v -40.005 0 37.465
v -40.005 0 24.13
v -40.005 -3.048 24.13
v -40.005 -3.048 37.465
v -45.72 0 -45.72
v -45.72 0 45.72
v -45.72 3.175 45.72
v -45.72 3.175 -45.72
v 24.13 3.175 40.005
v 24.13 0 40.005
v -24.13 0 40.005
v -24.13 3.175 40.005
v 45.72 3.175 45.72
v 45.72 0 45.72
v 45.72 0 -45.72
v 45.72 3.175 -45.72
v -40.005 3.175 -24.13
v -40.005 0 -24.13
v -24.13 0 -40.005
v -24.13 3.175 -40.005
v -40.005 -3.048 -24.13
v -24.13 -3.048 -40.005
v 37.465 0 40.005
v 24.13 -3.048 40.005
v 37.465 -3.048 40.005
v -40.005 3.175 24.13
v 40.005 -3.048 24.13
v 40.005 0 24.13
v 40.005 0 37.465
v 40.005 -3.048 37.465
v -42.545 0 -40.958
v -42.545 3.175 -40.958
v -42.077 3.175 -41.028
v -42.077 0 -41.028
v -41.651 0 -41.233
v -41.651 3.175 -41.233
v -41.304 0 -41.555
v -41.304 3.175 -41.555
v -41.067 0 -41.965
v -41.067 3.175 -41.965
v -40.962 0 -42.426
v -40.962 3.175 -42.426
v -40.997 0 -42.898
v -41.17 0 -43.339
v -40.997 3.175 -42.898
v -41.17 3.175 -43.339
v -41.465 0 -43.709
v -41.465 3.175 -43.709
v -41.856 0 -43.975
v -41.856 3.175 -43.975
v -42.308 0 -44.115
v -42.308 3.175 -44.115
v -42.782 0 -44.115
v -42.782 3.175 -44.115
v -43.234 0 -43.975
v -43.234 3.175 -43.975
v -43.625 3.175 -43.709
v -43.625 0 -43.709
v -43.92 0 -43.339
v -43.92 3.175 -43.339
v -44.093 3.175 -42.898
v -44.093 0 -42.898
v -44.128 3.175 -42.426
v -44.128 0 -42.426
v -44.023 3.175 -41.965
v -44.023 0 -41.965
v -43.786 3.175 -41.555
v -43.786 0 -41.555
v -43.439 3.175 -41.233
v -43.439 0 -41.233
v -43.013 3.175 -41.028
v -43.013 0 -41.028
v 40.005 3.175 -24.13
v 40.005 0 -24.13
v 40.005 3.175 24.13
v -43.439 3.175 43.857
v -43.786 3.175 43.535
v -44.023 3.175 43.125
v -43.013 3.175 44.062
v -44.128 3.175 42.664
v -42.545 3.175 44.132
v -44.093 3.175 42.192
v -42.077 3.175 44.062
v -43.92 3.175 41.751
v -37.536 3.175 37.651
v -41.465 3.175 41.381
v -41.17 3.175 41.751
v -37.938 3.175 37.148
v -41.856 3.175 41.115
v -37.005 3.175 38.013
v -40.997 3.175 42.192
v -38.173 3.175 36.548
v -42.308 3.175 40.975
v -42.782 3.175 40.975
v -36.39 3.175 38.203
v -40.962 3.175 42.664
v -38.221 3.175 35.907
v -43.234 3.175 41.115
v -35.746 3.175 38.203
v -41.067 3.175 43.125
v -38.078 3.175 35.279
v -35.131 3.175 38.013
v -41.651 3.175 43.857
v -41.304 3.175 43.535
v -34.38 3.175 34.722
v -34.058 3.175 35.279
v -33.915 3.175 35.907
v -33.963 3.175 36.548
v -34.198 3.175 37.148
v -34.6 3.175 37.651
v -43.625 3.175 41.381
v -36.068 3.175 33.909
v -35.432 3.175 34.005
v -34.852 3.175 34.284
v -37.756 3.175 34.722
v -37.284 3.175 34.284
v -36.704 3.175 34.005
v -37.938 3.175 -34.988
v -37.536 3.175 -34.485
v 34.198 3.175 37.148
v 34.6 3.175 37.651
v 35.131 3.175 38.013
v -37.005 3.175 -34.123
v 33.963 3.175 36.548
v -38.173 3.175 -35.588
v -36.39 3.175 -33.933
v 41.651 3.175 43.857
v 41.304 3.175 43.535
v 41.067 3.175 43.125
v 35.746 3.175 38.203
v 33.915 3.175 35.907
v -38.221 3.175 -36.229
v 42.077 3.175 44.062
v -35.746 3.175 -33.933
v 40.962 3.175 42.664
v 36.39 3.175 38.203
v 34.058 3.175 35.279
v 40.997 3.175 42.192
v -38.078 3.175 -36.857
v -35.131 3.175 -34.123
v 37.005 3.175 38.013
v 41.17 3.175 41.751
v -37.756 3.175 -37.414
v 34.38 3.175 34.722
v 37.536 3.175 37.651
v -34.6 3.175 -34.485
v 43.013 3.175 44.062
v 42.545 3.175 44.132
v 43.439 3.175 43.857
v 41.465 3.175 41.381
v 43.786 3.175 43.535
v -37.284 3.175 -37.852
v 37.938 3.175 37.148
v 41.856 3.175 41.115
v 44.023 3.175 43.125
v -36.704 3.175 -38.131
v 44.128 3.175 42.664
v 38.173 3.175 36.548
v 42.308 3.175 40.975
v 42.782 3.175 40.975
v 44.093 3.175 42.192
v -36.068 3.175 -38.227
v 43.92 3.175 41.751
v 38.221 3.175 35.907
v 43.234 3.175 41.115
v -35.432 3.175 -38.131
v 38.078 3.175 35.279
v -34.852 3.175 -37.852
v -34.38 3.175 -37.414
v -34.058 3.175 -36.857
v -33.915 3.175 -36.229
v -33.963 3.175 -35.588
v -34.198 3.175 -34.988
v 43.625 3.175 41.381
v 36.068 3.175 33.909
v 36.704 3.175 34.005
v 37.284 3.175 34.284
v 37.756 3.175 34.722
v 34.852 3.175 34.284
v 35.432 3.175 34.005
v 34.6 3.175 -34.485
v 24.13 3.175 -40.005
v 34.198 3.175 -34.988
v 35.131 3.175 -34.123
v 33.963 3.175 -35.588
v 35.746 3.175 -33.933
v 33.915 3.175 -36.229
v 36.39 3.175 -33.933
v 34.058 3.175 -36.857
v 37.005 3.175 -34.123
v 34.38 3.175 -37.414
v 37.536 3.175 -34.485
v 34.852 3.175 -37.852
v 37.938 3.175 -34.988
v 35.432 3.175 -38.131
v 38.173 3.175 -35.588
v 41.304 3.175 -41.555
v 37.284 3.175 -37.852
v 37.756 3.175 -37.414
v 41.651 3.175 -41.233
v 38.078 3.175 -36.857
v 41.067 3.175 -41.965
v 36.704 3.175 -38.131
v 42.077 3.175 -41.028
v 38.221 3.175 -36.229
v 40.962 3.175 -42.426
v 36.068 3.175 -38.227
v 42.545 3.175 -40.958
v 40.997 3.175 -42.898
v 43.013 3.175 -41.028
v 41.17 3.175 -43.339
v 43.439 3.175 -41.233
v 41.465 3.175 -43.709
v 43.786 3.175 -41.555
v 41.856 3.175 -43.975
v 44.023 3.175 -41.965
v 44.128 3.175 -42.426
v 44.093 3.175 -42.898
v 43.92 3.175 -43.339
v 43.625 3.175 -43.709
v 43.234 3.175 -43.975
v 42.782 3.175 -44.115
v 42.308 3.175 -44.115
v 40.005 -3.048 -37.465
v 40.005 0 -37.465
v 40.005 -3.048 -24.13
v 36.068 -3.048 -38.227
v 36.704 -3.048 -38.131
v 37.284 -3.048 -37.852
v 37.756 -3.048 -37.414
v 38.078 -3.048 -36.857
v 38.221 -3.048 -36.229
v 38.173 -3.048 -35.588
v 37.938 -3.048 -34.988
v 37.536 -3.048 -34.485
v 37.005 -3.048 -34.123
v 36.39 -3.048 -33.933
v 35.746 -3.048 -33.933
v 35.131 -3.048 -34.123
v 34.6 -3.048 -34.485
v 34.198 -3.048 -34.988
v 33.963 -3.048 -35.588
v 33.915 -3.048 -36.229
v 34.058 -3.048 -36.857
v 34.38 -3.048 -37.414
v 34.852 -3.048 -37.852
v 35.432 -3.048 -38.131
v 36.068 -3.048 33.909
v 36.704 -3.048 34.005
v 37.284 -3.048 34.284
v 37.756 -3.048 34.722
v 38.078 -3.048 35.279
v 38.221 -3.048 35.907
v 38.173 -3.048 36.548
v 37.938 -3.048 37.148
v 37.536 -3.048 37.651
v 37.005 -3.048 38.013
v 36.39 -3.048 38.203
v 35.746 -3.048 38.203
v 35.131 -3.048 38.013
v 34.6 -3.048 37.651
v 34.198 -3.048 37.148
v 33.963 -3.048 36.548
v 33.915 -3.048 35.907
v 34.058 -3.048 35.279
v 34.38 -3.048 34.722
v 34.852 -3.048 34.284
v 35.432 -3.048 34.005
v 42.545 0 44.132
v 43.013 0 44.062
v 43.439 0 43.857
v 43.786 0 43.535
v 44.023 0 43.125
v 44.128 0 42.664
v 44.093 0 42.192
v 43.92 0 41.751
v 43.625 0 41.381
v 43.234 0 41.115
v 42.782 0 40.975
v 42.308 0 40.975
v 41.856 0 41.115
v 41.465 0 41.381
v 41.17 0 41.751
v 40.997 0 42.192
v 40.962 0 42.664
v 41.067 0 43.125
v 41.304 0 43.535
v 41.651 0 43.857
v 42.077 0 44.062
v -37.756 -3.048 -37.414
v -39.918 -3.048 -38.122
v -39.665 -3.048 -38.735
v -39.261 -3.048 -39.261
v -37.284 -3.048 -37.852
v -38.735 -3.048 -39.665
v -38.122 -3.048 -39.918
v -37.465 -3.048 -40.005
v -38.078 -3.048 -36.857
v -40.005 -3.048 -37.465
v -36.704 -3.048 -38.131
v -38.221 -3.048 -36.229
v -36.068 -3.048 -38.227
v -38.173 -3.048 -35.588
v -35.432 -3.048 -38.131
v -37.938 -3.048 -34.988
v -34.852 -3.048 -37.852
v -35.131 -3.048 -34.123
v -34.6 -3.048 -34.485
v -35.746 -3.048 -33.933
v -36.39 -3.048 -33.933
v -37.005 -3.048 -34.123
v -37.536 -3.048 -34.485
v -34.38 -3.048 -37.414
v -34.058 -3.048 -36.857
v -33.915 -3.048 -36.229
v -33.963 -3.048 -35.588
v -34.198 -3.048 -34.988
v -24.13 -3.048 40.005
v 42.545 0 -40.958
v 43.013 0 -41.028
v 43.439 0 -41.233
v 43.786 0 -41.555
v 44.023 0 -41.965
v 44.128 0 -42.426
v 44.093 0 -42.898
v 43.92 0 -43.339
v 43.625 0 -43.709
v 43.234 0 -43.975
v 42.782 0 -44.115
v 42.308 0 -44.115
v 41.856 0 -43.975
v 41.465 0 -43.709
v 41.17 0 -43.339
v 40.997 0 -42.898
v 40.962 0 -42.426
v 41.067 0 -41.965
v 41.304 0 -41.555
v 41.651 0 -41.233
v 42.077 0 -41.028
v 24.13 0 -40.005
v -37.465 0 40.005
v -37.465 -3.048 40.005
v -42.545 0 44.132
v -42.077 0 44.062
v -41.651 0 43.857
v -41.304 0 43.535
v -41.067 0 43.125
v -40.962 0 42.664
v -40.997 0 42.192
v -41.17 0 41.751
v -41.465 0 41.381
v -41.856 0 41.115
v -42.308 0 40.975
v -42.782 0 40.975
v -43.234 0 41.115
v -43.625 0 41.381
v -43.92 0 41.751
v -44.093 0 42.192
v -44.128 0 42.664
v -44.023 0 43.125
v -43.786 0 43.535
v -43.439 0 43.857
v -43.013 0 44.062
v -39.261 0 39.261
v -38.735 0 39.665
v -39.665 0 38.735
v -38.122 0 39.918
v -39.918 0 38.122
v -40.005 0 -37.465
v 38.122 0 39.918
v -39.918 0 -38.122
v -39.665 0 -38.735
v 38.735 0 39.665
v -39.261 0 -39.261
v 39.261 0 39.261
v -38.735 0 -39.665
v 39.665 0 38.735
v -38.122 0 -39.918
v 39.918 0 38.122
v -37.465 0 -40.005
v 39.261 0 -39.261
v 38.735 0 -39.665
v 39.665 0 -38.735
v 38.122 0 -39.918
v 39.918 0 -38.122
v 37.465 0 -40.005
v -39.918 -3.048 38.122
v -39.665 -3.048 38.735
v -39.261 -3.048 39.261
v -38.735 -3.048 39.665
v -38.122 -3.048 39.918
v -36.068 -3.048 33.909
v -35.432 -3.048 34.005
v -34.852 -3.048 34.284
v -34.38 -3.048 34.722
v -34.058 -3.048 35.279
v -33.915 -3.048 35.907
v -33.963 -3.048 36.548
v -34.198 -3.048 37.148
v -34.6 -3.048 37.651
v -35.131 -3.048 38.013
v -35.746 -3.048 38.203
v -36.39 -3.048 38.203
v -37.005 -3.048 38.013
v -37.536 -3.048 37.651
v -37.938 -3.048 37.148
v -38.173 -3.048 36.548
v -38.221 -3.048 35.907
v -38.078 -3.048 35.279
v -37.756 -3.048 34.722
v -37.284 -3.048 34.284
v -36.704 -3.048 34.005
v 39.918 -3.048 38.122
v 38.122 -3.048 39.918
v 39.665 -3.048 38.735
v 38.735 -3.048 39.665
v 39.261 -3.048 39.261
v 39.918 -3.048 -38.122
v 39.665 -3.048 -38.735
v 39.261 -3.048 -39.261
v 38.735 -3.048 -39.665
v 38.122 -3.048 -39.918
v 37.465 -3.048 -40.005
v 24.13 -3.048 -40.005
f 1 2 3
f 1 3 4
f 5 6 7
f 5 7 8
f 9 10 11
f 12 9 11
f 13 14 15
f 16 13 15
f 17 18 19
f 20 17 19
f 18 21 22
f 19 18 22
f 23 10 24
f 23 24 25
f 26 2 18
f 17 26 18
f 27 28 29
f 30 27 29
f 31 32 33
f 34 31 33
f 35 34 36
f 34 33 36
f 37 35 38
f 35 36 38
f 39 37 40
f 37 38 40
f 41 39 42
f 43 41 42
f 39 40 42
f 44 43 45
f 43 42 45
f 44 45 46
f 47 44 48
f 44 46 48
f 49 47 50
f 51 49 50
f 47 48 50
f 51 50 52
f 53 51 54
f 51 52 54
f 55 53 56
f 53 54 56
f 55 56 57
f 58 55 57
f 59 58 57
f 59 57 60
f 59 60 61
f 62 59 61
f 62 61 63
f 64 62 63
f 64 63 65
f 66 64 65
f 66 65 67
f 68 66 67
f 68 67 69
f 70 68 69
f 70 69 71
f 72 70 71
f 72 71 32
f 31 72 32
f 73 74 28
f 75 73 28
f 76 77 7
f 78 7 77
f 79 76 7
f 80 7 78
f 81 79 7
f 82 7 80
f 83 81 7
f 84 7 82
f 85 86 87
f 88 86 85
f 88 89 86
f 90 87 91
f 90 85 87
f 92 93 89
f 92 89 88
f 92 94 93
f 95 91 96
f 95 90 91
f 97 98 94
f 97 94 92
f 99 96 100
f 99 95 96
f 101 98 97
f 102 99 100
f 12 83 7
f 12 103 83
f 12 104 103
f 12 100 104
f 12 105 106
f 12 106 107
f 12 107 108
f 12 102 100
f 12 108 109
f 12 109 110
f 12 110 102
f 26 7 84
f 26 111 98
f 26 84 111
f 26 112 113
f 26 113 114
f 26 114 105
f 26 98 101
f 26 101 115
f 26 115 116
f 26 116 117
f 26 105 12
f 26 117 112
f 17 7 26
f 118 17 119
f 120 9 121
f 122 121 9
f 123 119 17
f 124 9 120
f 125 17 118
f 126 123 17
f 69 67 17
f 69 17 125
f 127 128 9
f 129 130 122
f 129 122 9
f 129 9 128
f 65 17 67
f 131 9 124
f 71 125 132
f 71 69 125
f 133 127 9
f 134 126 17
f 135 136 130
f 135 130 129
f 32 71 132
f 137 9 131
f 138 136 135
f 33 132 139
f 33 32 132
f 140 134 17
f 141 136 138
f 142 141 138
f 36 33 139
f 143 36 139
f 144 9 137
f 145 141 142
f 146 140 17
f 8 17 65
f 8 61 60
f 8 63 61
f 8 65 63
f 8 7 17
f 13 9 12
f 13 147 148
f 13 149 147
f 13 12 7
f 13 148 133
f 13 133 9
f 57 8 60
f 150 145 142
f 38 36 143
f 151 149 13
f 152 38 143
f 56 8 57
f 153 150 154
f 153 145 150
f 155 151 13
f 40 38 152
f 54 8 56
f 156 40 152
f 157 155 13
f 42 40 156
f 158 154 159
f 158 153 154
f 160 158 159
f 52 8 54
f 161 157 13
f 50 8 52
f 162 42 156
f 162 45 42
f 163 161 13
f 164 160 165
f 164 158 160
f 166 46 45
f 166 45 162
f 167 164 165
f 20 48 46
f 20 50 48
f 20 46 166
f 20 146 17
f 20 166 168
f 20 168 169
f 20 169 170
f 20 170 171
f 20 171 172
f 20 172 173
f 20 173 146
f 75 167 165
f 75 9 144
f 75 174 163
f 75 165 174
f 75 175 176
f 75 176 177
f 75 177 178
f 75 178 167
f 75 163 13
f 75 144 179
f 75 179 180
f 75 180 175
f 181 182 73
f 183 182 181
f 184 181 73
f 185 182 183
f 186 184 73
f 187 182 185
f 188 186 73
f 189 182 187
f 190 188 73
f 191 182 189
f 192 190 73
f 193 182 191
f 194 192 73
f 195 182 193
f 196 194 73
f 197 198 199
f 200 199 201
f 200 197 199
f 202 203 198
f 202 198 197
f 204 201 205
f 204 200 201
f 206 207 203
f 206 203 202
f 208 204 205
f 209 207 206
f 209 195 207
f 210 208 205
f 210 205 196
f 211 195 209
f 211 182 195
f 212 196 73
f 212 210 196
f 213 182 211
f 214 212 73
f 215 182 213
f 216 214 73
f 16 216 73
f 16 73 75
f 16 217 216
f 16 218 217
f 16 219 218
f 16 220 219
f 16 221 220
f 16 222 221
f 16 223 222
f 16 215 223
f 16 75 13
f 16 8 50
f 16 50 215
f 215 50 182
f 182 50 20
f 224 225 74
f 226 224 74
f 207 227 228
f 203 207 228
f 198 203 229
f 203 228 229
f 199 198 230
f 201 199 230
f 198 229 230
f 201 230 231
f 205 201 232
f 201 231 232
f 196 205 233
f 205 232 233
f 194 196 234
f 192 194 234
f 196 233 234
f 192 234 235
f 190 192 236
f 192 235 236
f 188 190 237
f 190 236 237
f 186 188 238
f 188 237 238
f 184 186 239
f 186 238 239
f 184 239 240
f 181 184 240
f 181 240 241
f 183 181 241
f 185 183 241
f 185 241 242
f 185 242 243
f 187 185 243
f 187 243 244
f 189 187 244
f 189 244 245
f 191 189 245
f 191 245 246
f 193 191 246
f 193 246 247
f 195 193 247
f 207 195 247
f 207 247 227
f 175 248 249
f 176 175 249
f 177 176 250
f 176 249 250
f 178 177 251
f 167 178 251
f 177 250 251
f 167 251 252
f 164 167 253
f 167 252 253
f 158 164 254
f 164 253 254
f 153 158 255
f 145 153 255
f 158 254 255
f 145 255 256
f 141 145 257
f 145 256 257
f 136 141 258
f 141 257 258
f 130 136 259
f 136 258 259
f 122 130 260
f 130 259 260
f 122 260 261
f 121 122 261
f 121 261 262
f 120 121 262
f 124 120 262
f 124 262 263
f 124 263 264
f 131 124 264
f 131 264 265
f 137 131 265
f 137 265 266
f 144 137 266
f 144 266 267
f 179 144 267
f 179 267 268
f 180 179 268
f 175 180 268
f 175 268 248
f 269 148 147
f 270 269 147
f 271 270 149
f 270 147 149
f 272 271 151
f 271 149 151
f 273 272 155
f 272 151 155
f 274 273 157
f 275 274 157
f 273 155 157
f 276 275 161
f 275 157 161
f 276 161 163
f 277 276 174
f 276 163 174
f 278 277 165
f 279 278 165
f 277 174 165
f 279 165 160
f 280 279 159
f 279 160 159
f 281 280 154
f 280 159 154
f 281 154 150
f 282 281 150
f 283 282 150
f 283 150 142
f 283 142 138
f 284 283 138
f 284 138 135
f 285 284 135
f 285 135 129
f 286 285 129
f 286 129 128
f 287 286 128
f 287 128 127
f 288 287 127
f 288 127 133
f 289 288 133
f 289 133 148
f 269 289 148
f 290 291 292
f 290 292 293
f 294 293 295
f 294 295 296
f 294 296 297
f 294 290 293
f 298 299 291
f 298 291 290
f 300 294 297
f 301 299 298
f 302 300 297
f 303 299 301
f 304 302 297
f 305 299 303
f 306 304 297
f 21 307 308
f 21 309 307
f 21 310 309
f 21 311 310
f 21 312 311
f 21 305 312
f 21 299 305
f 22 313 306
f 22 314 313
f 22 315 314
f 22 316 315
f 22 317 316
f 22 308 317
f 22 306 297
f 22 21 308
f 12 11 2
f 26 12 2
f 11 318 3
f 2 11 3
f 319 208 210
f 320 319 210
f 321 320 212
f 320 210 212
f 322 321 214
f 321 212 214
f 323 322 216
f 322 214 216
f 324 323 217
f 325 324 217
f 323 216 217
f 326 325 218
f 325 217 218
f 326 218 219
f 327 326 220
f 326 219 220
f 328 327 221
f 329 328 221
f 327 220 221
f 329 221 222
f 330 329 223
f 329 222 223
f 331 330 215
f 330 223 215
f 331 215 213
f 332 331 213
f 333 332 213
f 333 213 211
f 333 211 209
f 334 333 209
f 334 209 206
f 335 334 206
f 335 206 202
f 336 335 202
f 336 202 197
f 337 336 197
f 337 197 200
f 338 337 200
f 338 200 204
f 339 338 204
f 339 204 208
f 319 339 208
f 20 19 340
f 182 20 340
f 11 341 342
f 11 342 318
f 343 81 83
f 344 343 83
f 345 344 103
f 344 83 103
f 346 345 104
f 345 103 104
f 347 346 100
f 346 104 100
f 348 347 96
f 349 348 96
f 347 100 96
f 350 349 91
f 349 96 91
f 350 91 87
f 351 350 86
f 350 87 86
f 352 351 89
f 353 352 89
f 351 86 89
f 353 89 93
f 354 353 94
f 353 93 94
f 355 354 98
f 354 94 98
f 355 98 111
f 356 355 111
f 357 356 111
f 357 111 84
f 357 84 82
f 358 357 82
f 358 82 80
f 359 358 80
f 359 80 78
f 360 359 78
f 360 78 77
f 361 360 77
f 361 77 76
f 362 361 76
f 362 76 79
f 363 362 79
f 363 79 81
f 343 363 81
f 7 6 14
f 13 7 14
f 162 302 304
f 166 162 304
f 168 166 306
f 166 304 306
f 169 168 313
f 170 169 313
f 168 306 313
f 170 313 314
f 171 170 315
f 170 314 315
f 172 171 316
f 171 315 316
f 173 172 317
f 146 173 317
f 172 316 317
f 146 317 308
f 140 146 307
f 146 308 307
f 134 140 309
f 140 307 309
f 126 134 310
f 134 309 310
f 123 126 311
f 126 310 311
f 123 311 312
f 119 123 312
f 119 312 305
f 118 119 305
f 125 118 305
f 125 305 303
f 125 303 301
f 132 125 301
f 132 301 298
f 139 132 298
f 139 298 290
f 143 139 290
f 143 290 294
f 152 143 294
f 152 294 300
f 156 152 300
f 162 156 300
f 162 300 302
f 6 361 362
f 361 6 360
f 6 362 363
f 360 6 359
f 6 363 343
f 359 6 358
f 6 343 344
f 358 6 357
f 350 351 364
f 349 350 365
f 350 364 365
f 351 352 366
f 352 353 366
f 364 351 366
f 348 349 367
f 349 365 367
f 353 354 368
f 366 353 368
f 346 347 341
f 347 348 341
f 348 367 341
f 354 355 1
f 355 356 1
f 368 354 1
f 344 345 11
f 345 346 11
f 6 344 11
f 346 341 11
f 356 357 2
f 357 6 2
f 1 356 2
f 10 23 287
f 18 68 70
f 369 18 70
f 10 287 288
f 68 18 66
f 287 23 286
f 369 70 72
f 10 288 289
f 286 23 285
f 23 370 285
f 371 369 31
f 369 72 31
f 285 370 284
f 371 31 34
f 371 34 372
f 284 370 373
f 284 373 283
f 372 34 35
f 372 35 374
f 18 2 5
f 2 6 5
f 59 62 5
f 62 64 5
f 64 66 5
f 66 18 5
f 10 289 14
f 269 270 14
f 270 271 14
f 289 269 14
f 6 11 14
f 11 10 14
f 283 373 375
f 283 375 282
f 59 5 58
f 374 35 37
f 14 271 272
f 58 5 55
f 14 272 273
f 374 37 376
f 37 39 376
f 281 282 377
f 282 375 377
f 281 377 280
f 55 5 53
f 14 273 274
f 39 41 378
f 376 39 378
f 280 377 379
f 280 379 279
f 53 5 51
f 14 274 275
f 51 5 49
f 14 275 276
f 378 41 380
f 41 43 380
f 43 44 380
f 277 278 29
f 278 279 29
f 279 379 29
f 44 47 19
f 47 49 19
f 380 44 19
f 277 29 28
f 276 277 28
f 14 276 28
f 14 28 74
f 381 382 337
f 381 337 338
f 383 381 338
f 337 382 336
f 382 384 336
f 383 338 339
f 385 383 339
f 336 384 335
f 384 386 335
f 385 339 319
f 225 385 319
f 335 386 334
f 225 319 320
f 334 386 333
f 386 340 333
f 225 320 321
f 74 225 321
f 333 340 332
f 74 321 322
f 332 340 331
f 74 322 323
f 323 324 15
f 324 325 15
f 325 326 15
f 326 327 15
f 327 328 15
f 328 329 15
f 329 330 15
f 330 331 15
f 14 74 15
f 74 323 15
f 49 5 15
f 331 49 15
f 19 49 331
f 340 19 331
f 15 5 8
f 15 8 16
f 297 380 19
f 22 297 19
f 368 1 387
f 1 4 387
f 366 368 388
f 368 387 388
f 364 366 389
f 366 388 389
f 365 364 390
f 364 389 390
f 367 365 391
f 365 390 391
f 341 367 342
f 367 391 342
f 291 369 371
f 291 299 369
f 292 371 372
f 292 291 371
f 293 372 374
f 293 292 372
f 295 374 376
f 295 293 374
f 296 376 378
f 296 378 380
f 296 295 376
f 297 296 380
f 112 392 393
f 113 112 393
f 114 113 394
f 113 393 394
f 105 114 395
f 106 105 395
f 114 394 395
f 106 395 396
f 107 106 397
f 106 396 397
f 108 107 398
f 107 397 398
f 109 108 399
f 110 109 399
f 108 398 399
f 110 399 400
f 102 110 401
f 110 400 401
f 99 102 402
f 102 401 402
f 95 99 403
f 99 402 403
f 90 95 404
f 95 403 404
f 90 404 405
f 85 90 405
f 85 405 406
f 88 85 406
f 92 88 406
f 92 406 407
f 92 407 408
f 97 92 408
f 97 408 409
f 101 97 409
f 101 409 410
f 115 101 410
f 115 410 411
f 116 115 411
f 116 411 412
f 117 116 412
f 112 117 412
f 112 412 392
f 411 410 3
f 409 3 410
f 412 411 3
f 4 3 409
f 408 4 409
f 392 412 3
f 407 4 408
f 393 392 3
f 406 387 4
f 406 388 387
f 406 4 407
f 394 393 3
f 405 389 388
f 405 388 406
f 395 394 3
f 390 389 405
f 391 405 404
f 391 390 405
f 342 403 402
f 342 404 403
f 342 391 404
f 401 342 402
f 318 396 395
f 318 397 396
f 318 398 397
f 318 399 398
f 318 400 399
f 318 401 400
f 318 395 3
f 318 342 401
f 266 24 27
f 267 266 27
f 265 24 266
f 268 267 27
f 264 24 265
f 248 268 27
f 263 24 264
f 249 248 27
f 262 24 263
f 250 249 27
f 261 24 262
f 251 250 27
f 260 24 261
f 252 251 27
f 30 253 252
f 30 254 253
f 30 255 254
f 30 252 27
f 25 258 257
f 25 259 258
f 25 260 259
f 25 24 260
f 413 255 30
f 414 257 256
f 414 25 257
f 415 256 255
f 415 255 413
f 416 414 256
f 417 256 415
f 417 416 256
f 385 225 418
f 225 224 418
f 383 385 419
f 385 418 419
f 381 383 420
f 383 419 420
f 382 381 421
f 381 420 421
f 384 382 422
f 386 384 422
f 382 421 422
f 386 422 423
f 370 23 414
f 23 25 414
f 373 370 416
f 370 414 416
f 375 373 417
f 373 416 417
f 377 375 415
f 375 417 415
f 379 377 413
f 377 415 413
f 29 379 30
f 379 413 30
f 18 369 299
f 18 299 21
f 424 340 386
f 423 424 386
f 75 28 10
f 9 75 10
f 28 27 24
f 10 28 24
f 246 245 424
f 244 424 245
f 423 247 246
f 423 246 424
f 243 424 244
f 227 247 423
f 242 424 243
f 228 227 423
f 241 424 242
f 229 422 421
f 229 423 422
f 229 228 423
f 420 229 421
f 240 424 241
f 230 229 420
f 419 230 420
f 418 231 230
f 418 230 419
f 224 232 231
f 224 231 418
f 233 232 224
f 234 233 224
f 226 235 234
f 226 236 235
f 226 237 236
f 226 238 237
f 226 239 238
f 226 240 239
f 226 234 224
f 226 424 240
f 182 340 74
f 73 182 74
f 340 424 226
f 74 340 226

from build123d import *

# Parameters (mm, degrees)
SKETCH1_W           = 91.44
SKETCH1_H           = 91.44
BOSS_EXTRUDE1_DEPTH = 3.175
SKETCH2_W           = 80.01
SKETCH2_H           = 80.01
BOSS_EXTRUDE2_DEPTH = 3.048
CUT_EXTRUDE1_DEPTH  = 65.956620363
SKETCH4_R           = 2.159
CUT_EXTRUDE2_DEPTH  = 65.956620363
FILLET1_R           = 2.54
SKETCH5_R           = 1.5875
CUT_EXTRUDE3_DEPTH  = 65.956620363


with BuildPart() as part:
    # Sketch1 → Boss-Extrude1 (new body)
    with BuildSketch(Plane(origin=(0, 0, 0), x_dir=(1, 0, 0), z_dir=(0, 1, 0))):
        Rectangle(SKETCH1_W, SKETCH1_H)
    extrude(amount=BOSS_EXTRUDE1_DEPTH)

    # Sketch2 → Boss-Extrude2 (add)
    with BuildSketch(Plane.XZ):
        Rectangle(SKETCH2_W, SKETCH2_H)
    extrude(amount=BOSS_EXTRUDE2_DEPTH)

    # Sketch3 → Cut-Extrude1 (cut, through all)
    with BuildSketch(Plane.XZ.offset(3.048)):
        Polygon((-24.13, 40.005), (-40.005, 24.13), (-40.005, -24.13), (-24.13, -40.005), (24.13, -40.005), (40.005, -24.13), (40.005, 24.13), (24.13, 40.005), align=None)
    extrude(amount=-CUT_EXTRUDE1_DEPTH, mode=Mode.SUBTRACT)

    # Sketch4 → Cut-Extrude2 (cut, through all)
    with BuildSketch(Plane.XZ.offset(3.048)):
        with Locations(Location((-36.068, 36.068, 0), (0, 0, 270))):
            Circle(SKETCH4_R)
        with Locations(Location((36.068, 36.068, 0), (0, 0, 270))):
            Circle(SKETCH4_R)
        with Locations(Location((36.068, -36.068, 0), (0, 0, 270))):
            Circle(SKETCH4_R)
        with Locations(Location((-36.068, -36.068, 0), (0, 0, 270))):
            Circle(SKETCH4_R)
    extrude(amount=-CUT_EXTRUDE2_DEPTH, mode=Mode.SUBTRACT)

    # Fillet1
    fillet1_edges = [part.edges().sort_by_distance(p)[0] for p in [
        (40.005, -1.524, -40.005),
        (40.005, -1.524, 40.005),
        (-40.005, -1.524, 40.005),
        (-40.005, -1.524, -40.005),
    ]]
    fillet(fillet1_edges, radius=FILLET1_R)

    # Sketch5 → Cut-Extrude3 (cut, through all)
    with BuildSketch(Plane(origin=(0, 3.175, 0), x_dir=(1, 0, 0), z_dir=(0, 1, 0))):
        with Locations(Location((-42.545, 42.545, 0), (0, 0, 270))):
            Circle(SKETCH5_R)
        with Locations(Location((42.545, 42.545, 0), (0, 0, 270))):
            Circle(SKETCH5_R)
        with Locations(Location((42.545, -42.545, 0), (0, 0, 270))):
            Circle(SKETCH5_R)
        with Locations(Location((-42.545, -42.545, 0), (0, 0, 270))):
            Circle(SKETCH5_R)
    extrude(amount=-CUT_EXTRUDE3_DEPTH, mode=Mode.SUBTRACT)


solid = part.part
